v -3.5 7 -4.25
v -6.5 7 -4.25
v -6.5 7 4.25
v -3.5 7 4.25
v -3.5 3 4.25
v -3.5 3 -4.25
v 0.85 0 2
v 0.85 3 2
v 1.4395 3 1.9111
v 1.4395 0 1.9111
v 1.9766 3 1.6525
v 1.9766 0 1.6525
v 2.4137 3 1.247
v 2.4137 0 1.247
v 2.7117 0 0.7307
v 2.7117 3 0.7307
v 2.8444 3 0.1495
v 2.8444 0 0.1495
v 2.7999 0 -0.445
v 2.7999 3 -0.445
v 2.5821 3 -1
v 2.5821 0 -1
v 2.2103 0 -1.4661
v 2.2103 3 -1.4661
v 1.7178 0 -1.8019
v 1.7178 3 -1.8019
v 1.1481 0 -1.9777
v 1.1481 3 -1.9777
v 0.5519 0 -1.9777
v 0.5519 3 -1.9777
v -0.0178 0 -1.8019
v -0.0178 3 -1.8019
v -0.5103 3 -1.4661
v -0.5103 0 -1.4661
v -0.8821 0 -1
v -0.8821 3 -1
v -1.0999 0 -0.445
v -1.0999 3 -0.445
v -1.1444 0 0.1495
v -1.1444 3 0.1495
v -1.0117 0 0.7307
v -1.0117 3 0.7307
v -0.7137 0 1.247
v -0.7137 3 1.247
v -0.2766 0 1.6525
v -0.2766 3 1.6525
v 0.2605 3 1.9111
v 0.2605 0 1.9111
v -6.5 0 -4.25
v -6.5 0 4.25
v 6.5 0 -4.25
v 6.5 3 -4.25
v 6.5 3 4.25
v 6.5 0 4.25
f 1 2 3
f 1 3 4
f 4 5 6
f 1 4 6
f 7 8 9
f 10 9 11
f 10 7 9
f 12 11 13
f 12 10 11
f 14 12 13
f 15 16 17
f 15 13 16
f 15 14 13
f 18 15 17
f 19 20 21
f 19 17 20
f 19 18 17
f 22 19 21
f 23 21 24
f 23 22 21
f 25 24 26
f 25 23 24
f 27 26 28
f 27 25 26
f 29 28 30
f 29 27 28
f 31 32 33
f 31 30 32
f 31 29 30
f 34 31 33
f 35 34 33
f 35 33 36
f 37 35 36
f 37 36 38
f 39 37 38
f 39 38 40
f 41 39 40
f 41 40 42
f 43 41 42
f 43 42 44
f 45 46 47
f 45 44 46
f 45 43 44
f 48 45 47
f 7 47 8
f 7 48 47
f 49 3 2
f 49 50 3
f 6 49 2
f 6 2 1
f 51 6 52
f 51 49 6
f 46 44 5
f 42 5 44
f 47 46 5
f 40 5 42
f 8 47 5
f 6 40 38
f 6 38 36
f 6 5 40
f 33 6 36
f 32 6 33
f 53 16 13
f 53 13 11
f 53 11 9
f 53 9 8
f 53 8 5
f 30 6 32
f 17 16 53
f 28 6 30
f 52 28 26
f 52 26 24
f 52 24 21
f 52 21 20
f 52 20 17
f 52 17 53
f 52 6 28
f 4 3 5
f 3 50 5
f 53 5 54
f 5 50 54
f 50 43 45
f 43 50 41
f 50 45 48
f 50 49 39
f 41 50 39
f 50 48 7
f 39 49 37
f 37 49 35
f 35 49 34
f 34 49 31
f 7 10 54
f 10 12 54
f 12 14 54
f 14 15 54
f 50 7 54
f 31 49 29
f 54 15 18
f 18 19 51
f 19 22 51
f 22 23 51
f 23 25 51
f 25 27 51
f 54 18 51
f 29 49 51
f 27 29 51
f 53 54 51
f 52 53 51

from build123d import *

# Parameters (mm, degrees)
SKETCH1_W           = 13
SKETCH1_H           = 8.5
BOSS_EXTRUDE2_DEPTH = 3
SKETCH2_R           = 2
CUT_EXTRUDE1_DEPTH  = 9.325412903
SKETCH3_W           = 3
SKETCH3_H           = 8.5
BOSS_EXTRUDE3_DEPTH = 4


with BuildPart() as part:
    # Sketch1 → Boss-Extrude2 (new body)
    with BuildSketch(Plane(origin=(0, 0, 0), x_dir=(1, 0, 0), z_dir=(0, 1, 0))):
        Rectangle(SKETCH1_W, SKETCH1_H)
    extrude(amount=BOSS_EXTRUDE2_DEPTH)

    # Sketch2 → Cut-Extrude1 (cut, through all)
    with BuildSketch(Plane(origin=(0, 0, 0), x_dir=(1, 0, 0), z_dir=(0, 1, 0))):
        with Locations(Location((0.85, 0, 0), (0, 0, 270))):
            Circle(SKETCH2_R)
    extrude(amount=CUT_EXTRUDE1_DEPTH, mode=Mode.SUBTRACT)

    # Sketch3 → Boss-Extrude3 (add)
    with BuildSketch(Plane(origin=(0, 3, 0), x_dir=(1, 0, 0), z_dir=(0, 1, 0))):
        with Locations((-5, 0)):
            Rectangle(SKETCH3_W, SKETCH3_H)
    extrude(amount=BOSS_EXTRUDE3_DEPTH)


solid = part.part
